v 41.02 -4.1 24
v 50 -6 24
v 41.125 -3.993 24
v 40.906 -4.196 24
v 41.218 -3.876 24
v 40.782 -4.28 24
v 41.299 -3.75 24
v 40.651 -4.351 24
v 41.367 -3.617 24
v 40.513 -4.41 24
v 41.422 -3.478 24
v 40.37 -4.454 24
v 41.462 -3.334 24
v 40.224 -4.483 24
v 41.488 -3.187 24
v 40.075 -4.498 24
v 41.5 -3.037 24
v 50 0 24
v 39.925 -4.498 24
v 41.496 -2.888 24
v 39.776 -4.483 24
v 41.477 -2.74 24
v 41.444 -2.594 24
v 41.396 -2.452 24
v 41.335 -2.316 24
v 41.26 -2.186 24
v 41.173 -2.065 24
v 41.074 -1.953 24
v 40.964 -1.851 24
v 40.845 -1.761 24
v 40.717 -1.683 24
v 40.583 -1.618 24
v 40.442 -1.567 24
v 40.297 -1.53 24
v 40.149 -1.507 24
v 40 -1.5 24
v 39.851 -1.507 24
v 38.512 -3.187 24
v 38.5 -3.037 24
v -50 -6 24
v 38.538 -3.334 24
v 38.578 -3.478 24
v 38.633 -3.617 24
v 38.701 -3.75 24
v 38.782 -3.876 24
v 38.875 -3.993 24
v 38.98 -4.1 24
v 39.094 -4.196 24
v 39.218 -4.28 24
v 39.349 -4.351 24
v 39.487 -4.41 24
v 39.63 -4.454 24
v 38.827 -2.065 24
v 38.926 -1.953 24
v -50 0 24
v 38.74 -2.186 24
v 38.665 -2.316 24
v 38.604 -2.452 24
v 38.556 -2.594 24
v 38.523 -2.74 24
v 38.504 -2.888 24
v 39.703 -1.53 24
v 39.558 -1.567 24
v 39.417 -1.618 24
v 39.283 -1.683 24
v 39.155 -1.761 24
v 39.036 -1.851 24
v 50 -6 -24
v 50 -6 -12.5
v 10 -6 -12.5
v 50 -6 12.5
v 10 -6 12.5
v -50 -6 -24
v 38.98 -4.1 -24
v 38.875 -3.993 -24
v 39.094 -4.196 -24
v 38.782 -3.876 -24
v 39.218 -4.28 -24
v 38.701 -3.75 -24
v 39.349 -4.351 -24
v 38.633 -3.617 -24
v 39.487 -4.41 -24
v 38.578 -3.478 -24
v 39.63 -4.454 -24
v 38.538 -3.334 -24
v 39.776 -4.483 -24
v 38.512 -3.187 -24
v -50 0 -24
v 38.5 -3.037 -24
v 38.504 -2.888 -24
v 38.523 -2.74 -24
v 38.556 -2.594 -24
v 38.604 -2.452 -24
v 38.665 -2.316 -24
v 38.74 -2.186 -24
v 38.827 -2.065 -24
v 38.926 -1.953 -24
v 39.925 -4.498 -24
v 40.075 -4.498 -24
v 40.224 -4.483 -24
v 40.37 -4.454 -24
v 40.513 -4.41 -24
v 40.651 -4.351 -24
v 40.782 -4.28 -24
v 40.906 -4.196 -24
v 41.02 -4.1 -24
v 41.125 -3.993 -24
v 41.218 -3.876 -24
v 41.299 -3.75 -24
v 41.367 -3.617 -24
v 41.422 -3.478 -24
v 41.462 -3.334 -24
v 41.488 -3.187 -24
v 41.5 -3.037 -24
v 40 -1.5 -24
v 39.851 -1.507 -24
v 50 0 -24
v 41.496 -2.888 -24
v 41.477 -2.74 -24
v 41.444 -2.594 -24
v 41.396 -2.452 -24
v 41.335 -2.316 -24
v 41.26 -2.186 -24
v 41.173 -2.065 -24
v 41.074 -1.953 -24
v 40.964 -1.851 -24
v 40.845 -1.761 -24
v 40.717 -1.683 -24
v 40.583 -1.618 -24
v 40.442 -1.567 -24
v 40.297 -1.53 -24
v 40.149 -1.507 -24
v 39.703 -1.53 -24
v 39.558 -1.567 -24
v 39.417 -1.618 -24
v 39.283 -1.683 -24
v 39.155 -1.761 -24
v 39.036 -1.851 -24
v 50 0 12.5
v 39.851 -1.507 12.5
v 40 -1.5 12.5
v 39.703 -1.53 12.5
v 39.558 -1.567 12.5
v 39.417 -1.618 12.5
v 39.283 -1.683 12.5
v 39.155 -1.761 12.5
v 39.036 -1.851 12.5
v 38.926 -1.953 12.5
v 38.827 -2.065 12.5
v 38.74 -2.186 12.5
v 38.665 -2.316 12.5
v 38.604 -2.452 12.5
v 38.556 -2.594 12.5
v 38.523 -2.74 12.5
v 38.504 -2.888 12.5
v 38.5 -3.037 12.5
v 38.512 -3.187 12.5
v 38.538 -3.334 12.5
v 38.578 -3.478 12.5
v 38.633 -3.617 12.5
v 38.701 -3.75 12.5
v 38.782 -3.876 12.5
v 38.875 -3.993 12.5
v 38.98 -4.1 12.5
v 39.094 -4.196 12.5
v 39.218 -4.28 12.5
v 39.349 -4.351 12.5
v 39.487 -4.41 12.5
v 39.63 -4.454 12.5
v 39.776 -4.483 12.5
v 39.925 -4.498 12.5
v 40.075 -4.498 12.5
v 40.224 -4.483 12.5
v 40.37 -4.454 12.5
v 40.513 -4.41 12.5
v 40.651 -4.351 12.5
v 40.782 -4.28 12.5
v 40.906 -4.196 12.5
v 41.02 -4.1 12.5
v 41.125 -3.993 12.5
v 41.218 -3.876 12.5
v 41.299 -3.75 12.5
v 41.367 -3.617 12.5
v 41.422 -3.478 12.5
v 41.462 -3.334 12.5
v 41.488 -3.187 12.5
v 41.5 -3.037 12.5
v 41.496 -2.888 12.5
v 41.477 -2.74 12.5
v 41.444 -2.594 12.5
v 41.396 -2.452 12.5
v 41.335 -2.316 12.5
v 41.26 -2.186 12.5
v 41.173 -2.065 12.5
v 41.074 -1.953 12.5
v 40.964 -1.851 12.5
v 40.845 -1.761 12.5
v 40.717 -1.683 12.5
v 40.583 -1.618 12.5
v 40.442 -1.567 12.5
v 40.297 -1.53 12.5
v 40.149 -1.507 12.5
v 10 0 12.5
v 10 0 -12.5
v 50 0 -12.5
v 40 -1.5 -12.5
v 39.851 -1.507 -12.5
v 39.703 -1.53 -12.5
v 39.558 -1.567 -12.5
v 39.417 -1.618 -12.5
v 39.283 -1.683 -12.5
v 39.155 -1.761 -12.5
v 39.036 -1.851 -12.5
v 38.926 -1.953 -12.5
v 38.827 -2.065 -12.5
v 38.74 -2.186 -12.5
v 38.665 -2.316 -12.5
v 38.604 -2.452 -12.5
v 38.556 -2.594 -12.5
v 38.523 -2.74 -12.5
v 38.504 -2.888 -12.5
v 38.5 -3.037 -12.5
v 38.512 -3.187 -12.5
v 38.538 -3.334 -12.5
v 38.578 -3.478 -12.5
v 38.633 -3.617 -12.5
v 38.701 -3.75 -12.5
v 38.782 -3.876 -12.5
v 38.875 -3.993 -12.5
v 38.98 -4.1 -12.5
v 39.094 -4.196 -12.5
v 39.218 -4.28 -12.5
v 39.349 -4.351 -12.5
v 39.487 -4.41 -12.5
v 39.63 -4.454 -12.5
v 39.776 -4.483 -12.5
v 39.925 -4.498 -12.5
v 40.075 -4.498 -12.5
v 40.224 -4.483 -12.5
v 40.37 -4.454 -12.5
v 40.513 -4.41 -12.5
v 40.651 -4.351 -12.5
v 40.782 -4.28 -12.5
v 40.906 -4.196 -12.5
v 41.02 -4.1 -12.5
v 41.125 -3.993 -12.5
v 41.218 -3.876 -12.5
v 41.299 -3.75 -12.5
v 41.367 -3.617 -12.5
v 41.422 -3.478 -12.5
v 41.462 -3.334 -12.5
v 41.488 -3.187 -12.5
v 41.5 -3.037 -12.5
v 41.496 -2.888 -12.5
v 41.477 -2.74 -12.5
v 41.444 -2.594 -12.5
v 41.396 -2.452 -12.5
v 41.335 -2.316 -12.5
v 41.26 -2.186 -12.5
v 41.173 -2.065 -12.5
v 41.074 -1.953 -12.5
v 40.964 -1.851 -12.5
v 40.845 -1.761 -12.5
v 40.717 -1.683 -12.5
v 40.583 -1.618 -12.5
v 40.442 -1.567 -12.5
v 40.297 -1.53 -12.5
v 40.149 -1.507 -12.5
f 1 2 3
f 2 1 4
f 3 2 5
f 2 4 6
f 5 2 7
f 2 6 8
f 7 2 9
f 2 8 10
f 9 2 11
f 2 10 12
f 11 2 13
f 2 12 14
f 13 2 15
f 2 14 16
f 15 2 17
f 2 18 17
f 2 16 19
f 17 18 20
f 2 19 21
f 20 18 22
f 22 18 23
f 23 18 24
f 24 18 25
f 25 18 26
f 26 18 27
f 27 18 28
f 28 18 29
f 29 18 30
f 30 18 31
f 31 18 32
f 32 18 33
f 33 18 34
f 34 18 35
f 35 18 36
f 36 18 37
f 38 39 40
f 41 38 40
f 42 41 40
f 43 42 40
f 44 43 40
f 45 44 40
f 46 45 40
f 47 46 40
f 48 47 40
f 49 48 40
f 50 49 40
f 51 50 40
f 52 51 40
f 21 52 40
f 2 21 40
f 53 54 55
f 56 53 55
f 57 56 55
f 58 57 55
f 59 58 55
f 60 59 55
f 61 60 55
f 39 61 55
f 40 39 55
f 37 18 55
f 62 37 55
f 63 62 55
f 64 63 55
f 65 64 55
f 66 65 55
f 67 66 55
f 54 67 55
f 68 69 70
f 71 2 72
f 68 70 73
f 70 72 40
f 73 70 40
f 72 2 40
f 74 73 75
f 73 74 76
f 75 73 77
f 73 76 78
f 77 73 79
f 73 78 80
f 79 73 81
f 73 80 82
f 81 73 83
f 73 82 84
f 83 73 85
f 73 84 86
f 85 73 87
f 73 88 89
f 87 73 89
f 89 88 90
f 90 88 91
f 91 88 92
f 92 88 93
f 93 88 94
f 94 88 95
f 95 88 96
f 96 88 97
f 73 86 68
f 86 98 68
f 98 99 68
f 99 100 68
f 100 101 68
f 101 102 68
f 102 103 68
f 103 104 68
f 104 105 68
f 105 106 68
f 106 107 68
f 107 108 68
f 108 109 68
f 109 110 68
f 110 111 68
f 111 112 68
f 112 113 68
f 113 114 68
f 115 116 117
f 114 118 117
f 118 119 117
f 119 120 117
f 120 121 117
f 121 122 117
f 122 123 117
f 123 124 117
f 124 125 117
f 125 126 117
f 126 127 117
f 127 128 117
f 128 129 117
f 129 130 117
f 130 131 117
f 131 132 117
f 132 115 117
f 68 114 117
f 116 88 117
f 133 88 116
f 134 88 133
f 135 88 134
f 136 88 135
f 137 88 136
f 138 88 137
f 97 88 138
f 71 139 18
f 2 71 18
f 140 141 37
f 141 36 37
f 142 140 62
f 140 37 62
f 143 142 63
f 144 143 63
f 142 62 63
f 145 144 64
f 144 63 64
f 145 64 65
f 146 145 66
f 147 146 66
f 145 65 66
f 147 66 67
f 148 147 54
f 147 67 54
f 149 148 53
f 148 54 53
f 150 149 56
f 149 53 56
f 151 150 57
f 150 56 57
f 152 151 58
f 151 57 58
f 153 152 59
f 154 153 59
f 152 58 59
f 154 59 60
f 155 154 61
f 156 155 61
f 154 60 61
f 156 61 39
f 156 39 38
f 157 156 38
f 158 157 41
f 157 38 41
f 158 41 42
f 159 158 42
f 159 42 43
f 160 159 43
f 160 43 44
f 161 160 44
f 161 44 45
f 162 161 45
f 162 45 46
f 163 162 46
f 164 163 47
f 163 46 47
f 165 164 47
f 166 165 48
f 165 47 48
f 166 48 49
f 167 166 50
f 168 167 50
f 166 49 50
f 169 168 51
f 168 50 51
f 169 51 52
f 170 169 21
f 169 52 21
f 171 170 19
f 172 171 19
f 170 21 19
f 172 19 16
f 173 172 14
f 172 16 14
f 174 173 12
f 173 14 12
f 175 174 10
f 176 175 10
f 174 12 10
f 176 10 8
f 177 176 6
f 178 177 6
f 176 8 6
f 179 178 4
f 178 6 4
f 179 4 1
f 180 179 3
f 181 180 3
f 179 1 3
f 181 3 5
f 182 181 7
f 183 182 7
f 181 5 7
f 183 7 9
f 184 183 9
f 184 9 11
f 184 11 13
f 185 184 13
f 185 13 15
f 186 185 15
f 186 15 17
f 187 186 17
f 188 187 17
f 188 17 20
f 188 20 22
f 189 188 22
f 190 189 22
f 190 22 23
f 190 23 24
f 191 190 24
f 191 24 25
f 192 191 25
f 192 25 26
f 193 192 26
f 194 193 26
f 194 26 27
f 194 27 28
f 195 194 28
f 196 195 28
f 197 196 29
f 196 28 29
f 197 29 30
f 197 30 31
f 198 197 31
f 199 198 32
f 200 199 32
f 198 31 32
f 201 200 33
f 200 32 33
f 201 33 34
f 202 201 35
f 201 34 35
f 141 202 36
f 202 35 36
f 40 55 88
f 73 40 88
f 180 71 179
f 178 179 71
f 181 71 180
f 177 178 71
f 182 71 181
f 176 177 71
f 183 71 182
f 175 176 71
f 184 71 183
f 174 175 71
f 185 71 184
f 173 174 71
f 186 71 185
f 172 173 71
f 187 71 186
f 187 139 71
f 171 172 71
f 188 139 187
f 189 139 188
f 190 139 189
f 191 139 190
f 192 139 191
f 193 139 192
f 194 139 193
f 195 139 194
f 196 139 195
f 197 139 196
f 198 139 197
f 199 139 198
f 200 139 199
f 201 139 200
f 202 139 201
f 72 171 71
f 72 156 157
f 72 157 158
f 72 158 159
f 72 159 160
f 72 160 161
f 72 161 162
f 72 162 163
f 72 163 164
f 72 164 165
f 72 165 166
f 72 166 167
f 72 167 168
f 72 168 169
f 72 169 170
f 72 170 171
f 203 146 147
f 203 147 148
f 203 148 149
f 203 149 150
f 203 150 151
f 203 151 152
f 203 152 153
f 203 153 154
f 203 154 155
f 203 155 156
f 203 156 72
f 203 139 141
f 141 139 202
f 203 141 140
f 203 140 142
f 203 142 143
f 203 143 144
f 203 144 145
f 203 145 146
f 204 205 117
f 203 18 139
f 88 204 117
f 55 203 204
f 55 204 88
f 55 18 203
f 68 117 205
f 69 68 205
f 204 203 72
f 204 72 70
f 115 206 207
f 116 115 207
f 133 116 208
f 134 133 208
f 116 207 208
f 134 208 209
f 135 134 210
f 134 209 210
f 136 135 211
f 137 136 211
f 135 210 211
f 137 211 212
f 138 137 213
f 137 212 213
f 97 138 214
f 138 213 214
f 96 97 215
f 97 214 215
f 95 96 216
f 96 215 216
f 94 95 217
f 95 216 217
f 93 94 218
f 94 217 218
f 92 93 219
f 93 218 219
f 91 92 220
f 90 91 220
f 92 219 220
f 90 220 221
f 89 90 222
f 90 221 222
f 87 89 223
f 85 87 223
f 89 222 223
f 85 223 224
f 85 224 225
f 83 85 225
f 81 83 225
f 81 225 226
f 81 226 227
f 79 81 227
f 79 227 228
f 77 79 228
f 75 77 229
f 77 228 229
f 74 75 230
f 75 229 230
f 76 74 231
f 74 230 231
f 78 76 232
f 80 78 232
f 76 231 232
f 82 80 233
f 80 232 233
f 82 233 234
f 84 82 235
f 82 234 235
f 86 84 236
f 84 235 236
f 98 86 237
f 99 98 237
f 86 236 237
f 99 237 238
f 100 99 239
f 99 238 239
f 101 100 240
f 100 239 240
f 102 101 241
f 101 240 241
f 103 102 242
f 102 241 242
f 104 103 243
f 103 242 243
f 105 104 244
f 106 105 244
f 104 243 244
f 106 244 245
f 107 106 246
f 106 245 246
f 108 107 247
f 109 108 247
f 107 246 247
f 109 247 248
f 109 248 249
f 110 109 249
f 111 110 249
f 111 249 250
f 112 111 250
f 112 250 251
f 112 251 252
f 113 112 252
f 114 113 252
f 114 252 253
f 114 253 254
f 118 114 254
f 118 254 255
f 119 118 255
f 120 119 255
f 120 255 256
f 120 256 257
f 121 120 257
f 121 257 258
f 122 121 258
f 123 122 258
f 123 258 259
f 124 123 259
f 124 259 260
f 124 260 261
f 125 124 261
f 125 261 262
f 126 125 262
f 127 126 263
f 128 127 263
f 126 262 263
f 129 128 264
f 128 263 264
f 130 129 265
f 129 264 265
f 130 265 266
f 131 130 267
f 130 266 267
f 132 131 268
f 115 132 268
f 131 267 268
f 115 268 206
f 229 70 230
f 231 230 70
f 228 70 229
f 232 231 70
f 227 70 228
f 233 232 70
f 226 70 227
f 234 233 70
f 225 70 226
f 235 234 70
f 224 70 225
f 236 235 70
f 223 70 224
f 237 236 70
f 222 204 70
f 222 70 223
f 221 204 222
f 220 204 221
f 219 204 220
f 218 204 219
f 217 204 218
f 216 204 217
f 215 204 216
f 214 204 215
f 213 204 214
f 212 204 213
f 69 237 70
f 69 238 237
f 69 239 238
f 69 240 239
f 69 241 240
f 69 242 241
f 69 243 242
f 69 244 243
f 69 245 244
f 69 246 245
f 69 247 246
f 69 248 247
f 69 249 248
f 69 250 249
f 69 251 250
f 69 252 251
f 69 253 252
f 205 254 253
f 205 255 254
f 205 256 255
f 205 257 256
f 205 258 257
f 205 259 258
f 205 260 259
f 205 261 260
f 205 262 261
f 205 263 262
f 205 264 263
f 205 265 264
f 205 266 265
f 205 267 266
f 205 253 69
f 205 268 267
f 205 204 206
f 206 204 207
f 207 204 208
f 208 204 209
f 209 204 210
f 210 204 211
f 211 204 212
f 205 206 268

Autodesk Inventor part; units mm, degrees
ref_plane "YZ Plane" through (0, 0, 0) normal (1, 0, 0) x (0, 1, 0)
ref_plane "XZ Plane" through (0, 0, 0) normal (0, 1, 0) x (-1, 0, 0)
ref_plane "XY Plane" through (0, 0, 0) normal (0, 0, 1) x (1, 0, 0)
sketch "Sketch1" plane through (0, 0, 0) normal (0, 1, 0) x (-1, 0, 0)
  line L0 (-50, 24) -> (50, 24)
  line L1 (50, 24) -> (50, -24)
  line L2 (50, -24) -> (-50, -24)
  line L3 (-50, -24) -> (-50, 24)
  point P0 (0, 0)
  point P1 (-50, 0)
  point P2 (0, 24)
  point P3 (-5, -14)
  dimension "d0" = 100
  dimension "d1" = 48
  dimension "d4" = 45
  dimension "d5" = 10
extrude "Extrusion1" add sketch "Sketch1" against normal blind 6
sketch "Sketch2" plane through (0, 0, 0) normal (0, 1, 0) x (1, 0, 0)
  line L0 (50, 24) -> (-50, 24) projected
  line L1 (-50, 24) -> (-50, -24) projected
  line L2 (-50, -24) -> (50, -24) projected
  line L3 (50, -24) -> (50, 24) projected
  line L4 (50, 24) -> (50, -24) projected
  line L5 (50, -12.5) -> (10, -12.5)
  line L6 (10, -12.5) -> (10, 12.5)
  line L7 (10, 12.5) -> (50, 12.5)
  line L8 (50, 12.5) -> (50, -12.5)
  point P0 (0, 0)
  point P1 (10, 0)
  dimension "d6" = 40
  dimension "d7" = 25
extrude "Extrusion2" cut sketch "Sketch2" against normal blind 6 contours L3 L5 L6 L7
sketch "Sketch4" plane through (50, 0, -24) normal (0, 0, -1) x (-1, 0, 0)
  line L0 (0, 0) -> (0, -6) projected
  point P0 (50, 0)
  point P1 (10, -3)
  point P2 (0, -3)
  dimension "d12" = 10
hole "Hole1" at (40, -3, -24) direction (0, 0, 1) diameter 3 end through all
properties part number "Mausefallle" material "Wood (Oak)"
